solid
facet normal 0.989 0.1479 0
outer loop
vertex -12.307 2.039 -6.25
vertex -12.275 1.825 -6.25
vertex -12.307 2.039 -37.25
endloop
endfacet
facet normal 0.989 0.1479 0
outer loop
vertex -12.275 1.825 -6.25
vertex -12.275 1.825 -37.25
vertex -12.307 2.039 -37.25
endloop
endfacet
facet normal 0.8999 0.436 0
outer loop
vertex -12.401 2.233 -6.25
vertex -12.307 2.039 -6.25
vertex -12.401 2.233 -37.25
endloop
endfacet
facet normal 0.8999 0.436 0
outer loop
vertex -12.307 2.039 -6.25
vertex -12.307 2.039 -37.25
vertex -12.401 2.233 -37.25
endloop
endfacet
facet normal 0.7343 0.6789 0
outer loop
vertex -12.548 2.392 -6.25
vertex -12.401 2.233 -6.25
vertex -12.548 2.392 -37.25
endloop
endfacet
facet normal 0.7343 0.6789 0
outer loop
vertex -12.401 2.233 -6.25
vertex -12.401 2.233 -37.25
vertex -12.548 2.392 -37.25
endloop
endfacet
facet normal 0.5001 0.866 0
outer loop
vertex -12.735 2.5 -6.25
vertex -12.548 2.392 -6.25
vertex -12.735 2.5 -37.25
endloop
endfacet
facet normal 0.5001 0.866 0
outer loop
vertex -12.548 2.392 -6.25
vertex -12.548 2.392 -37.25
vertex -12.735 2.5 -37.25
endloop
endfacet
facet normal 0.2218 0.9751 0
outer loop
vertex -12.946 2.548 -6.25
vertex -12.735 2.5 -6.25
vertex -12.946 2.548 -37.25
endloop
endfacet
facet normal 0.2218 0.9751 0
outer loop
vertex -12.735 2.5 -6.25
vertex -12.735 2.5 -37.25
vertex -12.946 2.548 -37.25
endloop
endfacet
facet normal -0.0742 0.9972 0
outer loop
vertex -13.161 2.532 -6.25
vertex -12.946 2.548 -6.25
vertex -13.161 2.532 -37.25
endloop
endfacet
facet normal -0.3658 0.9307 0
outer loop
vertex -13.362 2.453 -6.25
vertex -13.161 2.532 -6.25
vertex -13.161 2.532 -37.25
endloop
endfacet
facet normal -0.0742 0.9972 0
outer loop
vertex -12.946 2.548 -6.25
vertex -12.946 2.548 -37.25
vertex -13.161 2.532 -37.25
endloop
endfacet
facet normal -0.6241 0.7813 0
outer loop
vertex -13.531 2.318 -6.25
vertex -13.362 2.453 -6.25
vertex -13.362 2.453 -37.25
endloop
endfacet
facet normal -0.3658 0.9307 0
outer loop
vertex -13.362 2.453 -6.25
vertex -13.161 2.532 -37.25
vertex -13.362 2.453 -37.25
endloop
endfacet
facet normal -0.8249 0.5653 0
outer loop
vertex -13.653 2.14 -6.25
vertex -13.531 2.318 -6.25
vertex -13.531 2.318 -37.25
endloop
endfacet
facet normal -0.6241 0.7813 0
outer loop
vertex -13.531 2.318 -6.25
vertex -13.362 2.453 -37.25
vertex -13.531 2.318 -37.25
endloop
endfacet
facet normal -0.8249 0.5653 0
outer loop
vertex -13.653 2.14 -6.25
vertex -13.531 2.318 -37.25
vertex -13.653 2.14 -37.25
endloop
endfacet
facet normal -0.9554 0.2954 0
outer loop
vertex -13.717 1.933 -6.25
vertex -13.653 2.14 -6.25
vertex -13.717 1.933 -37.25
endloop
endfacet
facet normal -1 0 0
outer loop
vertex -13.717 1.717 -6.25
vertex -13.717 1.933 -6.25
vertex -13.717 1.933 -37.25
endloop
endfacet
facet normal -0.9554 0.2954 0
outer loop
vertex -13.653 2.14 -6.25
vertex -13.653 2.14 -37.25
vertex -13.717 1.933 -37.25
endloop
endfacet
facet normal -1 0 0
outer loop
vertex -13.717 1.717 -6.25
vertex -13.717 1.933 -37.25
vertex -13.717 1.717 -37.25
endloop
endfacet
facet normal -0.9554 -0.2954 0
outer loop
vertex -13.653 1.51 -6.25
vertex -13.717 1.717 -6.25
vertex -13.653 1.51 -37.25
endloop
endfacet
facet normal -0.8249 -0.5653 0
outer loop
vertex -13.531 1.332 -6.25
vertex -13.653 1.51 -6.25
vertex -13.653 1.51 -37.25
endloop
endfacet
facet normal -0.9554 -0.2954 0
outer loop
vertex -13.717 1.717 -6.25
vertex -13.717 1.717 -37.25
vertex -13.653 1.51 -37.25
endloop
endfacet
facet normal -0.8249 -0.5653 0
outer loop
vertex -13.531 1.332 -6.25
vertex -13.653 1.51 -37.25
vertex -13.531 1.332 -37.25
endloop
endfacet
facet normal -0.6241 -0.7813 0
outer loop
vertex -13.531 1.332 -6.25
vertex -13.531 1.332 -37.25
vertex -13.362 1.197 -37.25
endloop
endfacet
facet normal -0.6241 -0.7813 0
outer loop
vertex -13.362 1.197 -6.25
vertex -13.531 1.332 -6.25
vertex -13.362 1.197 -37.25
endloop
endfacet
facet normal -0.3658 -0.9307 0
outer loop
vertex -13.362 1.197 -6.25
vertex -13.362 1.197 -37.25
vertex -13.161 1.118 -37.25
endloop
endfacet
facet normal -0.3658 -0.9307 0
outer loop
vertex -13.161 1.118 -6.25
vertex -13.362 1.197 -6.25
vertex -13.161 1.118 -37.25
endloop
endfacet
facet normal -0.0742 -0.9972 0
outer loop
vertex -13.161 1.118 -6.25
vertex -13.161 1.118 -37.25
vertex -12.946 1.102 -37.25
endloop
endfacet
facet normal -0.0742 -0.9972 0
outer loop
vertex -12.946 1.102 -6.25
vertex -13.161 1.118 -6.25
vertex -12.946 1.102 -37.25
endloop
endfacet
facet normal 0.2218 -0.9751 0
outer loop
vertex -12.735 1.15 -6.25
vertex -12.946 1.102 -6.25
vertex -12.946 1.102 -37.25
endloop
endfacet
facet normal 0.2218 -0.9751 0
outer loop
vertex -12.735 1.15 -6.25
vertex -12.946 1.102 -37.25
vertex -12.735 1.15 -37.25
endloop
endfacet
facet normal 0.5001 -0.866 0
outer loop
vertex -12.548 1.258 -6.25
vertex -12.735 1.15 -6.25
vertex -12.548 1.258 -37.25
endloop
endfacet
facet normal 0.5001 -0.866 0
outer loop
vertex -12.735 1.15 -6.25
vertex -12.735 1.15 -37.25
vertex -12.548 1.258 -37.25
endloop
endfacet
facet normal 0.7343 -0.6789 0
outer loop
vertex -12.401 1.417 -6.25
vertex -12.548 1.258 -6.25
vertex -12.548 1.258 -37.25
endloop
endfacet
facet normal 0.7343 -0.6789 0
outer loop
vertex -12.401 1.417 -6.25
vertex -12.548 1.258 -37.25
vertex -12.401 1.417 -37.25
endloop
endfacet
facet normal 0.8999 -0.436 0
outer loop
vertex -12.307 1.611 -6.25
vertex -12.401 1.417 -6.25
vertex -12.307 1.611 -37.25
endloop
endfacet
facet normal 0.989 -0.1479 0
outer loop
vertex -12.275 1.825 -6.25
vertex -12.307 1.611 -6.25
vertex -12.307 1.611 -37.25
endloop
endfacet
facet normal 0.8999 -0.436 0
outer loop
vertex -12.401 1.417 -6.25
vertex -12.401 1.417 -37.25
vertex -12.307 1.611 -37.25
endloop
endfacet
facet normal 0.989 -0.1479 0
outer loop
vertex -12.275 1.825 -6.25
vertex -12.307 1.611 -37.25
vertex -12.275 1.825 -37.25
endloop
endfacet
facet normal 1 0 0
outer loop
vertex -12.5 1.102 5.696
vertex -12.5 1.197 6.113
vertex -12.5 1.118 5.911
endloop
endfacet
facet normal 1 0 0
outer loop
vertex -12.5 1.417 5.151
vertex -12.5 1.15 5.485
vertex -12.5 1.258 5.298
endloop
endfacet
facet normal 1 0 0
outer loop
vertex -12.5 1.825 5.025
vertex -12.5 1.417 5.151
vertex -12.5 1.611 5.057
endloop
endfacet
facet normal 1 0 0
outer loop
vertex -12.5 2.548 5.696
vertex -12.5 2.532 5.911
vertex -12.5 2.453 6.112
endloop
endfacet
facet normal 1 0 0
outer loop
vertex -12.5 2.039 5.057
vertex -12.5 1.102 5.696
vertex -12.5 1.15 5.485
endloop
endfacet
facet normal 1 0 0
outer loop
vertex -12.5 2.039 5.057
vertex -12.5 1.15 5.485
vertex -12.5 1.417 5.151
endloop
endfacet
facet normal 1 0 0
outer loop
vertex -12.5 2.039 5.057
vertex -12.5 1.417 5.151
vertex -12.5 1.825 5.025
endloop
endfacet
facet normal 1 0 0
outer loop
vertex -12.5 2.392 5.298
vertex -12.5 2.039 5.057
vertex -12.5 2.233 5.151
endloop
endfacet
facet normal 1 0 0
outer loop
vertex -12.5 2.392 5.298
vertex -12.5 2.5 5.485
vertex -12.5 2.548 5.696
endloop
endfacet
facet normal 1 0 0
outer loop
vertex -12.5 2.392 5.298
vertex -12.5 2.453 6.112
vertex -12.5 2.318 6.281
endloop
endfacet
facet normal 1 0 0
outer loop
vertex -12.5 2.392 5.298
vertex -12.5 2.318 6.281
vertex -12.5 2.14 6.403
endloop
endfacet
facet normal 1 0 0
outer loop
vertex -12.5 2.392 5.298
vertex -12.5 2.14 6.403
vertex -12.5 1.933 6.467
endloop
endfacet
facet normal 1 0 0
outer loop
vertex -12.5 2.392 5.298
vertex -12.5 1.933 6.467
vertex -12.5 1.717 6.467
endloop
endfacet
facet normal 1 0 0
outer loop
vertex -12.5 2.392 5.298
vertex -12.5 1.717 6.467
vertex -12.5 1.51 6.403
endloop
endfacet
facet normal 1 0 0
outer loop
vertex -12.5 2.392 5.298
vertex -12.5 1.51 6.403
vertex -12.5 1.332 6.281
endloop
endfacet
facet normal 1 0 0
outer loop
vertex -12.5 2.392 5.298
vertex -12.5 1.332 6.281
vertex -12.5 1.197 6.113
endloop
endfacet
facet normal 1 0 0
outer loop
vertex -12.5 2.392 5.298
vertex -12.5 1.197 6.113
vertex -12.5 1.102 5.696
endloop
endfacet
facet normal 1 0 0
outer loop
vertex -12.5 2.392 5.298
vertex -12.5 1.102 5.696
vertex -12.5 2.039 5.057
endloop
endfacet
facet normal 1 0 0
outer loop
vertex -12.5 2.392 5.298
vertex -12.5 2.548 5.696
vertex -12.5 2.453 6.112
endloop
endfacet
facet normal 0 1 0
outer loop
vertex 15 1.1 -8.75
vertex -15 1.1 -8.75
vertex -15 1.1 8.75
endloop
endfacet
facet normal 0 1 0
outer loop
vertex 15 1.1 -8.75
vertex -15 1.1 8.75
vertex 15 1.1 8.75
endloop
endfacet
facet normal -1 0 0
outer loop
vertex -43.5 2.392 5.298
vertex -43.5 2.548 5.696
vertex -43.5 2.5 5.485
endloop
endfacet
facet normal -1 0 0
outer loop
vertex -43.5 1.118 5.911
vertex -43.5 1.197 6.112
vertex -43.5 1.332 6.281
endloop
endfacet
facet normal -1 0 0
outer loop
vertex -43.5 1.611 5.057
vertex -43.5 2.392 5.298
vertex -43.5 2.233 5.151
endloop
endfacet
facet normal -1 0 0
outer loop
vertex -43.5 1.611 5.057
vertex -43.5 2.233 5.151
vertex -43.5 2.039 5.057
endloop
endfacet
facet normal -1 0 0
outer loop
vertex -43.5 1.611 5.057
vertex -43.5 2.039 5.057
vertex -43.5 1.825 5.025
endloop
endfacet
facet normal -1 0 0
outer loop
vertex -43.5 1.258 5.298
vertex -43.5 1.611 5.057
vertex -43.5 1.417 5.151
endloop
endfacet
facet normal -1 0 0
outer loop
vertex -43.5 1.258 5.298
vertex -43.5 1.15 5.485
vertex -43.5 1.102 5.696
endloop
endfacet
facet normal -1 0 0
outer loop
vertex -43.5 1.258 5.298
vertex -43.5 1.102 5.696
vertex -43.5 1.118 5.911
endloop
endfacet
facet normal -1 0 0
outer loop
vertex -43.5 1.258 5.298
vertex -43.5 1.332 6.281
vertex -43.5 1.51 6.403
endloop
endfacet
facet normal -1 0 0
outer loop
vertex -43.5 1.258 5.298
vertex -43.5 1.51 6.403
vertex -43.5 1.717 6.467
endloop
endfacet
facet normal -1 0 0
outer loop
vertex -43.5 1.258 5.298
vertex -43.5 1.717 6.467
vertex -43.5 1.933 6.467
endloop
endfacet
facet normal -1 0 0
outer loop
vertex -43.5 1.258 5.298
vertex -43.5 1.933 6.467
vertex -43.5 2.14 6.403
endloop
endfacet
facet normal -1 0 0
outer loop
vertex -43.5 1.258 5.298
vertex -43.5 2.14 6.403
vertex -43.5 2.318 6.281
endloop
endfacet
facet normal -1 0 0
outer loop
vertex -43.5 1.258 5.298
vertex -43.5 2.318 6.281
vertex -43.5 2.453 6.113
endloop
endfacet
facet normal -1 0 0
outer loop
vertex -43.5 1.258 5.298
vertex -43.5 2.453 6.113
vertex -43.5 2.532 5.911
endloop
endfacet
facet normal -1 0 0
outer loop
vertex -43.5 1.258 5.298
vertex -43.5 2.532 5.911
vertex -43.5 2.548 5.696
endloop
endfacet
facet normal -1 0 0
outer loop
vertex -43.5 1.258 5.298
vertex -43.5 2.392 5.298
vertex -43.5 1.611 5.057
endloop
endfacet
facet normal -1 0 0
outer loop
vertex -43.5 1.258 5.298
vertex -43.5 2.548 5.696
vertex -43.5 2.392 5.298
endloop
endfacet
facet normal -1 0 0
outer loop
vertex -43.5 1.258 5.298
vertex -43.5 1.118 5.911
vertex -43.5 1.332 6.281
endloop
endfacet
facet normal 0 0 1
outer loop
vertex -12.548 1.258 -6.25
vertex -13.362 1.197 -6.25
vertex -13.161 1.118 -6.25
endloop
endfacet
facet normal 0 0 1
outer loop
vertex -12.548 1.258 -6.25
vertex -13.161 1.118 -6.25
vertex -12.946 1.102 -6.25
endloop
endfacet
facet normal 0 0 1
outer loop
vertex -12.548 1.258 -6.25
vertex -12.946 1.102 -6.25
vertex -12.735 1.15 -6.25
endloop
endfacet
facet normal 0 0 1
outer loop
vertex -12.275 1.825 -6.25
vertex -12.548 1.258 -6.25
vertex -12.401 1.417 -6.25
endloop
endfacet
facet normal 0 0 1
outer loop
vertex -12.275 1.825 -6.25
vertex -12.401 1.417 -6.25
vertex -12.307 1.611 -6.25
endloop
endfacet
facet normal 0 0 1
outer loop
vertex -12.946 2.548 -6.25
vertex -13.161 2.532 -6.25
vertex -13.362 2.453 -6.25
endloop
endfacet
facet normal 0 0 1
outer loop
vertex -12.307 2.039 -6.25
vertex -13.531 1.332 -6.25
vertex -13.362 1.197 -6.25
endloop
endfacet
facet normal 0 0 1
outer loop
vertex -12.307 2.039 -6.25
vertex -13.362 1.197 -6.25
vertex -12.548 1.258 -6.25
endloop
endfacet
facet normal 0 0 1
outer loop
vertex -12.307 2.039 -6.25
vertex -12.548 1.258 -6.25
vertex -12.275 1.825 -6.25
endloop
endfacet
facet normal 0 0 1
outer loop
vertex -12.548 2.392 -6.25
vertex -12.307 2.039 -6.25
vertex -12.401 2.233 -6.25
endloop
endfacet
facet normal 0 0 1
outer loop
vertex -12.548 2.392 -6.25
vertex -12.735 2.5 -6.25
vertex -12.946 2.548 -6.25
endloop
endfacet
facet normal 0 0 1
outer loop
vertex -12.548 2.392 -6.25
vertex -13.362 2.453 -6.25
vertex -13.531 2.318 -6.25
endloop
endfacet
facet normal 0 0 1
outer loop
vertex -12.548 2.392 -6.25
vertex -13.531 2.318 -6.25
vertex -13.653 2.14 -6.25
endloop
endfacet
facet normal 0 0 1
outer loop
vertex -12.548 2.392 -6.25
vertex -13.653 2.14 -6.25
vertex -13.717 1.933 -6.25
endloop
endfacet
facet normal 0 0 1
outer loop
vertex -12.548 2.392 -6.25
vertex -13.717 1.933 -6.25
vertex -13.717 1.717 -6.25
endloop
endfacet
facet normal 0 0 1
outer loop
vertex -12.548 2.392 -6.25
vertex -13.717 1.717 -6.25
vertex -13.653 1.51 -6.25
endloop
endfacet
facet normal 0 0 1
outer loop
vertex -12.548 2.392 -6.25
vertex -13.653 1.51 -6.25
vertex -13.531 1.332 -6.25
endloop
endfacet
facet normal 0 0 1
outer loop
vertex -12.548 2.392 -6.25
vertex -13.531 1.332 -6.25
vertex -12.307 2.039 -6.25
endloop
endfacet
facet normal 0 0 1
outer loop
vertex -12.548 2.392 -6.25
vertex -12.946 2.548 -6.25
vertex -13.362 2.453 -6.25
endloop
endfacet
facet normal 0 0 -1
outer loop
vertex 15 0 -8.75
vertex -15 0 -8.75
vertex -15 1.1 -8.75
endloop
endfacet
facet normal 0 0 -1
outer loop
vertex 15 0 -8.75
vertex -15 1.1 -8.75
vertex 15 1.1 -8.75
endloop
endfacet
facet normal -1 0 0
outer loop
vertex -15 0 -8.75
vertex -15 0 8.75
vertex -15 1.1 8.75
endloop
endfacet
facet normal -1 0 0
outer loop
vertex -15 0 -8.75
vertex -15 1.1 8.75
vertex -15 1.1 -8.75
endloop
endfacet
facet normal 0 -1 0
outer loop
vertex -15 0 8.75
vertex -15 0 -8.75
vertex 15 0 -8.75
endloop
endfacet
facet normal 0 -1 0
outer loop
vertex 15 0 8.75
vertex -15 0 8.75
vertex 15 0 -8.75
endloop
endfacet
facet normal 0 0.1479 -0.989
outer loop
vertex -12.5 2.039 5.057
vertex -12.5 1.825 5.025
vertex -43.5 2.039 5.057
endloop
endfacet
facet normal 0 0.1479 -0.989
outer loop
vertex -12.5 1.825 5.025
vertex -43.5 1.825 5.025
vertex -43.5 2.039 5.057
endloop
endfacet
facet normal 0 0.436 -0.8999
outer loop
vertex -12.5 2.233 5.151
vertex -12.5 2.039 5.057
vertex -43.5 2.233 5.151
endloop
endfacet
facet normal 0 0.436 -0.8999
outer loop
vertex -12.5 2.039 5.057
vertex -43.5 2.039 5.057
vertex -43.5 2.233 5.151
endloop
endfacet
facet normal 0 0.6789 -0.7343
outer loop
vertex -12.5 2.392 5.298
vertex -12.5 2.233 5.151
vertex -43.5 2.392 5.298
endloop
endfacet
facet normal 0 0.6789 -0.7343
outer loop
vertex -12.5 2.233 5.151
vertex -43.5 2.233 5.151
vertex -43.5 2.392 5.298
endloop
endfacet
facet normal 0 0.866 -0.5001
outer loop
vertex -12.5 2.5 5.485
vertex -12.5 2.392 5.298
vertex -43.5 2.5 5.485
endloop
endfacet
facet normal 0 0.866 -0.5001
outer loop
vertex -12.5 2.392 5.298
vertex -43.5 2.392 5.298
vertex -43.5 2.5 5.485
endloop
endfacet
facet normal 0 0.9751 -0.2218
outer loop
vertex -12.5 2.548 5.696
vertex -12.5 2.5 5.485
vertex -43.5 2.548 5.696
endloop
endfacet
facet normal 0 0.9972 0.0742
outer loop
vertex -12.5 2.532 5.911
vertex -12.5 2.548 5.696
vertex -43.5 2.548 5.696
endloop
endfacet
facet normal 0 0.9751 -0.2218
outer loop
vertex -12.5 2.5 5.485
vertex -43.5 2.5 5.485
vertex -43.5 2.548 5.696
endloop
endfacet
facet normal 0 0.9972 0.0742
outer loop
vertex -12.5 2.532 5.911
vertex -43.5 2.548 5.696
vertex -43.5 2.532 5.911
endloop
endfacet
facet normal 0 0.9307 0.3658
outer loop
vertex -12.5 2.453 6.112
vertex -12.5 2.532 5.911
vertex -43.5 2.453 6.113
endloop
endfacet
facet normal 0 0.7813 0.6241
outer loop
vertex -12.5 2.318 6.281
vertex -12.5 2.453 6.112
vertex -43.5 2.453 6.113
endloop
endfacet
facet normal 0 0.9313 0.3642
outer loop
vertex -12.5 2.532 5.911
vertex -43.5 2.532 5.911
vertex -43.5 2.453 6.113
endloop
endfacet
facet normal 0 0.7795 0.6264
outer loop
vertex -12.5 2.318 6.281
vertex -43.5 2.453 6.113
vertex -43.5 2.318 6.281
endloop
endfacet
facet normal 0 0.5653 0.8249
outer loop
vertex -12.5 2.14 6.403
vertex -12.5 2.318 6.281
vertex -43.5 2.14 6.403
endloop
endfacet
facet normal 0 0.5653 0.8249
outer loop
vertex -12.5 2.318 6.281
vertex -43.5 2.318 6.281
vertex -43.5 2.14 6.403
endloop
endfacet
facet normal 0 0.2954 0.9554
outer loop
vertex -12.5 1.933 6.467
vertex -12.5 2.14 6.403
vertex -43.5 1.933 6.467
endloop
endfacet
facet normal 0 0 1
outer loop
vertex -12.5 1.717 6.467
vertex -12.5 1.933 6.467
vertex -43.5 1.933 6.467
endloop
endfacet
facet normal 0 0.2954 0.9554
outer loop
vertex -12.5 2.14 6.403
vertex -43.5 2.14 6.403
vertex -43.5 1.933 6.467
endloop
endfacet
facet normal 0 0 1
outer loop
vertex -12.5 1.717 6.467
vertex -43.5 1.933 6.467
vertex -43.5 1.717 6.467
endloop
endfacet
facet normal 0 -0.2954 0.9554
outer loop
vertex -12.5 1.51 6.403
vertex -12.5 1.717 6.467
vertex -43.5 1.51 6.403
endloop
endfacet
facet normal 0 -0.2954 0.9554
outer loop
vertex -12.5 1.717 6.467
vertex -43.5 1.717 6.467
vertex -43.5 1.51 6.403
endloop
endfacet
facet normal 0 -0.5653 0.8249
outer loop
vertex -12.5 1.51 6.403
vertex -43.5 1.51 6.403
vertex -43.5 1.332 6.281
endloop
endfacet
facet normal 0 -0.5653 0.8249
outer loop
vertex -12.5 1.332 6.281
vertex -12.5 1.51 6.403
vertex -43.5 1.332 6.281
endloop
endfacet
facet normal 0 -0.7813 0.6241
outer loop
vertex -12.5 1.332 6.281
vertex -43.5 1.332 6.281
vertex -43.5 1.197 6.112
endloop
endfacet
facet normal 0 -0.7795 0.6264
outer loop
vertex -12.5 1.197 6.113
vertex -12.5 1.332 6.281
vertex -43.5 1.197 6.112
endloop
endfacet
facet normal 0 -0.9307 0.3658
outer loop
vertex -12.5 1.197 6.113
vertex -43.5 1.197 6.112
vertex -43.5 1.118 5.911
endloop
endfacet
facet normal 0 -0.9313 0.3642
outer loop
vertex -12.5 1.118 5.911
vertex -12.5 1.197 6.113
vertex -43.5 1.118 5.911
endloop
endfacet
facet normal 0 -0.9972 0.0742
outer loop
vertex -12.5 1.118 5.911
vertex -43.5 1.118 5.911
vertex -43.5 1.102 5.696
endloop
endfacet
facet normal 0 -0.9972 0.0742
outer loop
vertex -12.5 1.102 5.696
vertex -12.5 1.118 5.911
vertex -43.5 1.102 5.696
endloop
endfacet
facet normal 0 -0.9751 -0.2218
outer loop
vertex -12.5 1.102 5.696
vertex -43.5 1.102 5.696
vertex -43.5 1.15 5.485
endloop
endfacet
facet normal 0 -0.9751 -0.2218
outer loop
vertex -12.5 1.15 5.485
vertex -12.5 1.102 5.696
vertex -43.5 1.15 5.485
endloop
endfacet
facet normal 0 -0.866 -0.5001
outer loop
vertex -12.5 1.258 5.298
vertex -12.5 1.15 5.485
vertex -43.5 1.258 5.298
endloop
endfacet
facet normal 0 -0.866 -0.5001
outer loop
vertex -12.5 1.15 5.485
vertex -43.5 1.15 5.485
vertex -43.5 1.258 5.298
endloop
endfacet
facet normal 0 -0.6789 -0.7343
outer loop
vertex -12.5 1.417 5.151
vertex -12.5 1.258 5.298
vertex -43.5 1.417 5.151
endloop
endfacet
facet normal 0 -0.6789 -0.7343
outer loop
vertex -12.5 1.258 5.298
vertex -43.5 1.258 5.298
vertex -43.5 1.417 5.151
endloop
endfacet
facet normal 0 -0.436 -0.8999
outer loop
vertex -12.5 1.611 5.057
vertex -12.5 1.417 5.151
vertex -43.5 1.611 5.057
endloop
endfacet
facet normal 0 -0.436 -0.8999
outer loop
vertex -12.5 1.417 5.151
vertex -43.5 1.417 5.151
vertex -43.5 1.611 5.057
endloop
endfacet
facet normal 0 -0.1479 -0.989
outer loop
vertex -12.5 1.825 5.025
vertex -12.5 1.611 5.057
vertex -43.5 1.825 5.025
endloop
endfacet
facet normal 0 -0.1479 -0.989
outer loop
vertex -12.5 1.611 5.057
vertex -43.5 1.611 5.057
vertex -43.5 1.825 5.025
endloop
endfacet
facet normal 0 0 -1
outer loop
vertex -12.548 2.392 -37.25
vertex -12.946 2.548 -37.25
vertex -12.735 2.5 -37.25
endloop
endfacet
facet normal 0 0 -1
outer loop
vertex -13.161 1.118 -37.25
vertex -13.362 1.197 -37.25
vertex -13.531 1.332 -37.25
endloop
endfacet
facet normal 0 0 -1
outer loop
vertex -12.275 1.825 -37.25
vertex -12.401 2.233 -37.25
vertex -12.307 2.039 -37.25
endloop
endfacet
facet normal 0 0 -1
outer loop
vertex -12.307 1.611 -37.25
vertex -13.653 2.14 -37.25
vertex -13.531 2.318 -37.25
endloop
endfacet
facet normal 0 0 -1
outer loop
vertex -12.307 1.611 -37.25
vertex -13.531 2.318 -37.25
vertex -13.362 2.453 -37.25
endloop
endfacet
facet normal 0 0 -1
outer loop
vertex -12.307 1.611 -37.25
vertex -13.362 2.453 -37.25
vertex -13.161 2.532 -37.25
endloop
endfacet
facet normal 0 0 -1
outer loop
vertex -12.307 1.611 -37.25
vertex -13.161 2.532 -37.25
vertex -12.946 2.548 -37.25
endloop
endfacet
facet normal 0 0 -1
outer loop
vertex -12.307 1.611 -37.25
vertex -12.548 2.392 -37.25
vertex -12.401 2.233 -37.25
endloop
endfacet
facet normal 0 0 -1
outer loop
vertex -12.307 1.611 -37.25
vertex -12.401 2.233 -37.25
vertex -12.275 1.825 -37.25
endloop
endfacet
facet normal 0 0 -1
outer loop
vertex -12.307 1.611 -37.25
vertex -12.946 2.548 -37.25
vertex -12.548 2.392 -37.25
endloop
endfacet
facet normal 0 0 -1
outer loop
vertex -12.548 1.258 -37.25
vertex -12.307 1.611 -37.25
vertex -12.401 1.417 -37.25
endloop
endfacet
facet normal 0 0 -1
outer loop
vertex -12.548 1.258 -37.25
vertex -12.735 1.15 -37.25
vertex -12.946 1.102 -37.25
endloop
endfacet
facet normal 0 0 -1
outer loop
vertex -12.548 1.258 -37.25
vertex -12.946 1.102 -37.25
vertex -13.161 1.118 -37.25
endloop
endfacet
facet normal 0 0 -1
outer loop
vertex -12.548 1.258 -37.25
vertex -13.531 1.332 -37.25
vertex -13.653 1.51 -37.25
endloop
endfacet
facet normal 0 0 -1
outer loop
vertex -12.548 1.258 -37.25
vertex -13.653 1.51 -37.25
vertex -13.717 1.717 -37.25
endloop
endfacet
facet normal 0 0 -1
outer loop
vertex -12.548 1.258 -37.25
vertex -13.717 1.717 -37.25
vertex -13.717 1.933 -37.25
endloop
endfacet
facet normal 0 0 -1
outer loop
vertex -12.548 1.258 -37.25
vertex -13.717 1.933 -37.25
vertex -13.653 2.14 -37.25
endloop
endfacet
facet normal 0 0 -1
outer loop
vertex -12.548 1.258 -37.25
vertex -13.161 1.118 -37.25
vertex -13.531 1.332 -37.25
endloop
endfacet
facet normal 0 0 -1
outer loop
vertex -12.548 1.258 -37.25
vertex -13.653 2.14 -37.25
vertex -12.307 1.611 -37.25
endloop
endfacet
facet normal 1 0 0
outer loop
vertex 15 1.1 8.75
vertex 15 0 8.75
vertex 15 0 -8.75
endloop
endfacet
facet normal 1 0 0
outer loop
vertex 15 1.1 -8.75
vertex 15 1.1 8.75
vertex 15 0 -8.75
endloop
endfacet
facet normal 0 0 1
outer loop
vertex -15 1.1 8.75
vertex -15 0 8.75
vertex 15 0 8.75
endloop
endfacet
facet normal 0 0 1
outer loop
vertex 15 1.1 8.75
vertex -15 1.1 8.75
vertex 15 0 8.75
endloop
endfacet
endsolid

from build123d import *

# Parameters (mm, degrees)
SKETCH1_W           = 30
SKETCH1_H           = 17.5
BOSS_EXTRUDE1_DEPTH = 1.1
SKETCH2_R           = 0.725
BOSS_EXTRUDE2_DEPTH = 28.5
SKETCH4_R           = 0.725
BOSS_EXTRUDE3_DEPTH = 28.5
SKETCH6_R           = 0.725
BOSS_EXTRUDE4_DEPTH = 2.5
SKETCH7_R           = 0.725
BOSS_EXTRUDE5_DEPTH = 2.5


with BuildPart() as part:
    # Sketch1 → Boss-Extrude1 (new body)
    with BuildSketch(Plane(origin=(0, 0, 0), x_dir=(1, 0, 0), z_dir=(0, 1, 0))):
        Rectangle(SKETCH1_W, SKETCH1_H)
    extrude(amount=BOSS_EXTRUDE1_DEPTH)


with BuildPart() as body_2:
    # Sketch2 → Boss-Extrude2 (new body)
    with BuildSketch(Plane(origin=(0, 0, -8.75), x_dir=(-1, 0, 0), z_dir=(0, 0, -1))):
        with Locations(Location((13, 1.825, 0), (0, 0, 180))):
            Circle(SKETCH2_R)
    extrude(amount=BOSS_EXTRUDE2_DEPTH)

    # Sketch6 → Boss-Extrude4 (add)
    with BuildSketch(Plane.XY.offset(-8.75)):
        with Locations((-13, 1.825)):
            Circle(SKETCH6_R)
    extrude(amount=BOSS_EXTRUDE4_DEPTH)


with BuildPart() as body_3:
    # Sketch4 → Boss-Extrude3 (new body)
    with BuildSketch(Plane.ZY.offset(15)):
        with Locations(Location((5.75, 1.825, 0), (0, 0, 180))):
            Circle(SKETCH4_R)
    extrude(amount=BOSS_EXTRUDE3_DEPTH)

    # Sketch7 → Boss-Extrude5 (add)
    with BuildSketch(Plane(origin=(-15, 0, 0), x_dir=(0, 0, -1), z_dir=(1, 0, 0))):
        with Locations((-5.75, 1.825)):
            Circle(SKETCH7_R)
    extrude(amount=BOSS_EXTRUDE5_DEPTH)


solid = Compound([part.part, body_2.part, body_3.part])
